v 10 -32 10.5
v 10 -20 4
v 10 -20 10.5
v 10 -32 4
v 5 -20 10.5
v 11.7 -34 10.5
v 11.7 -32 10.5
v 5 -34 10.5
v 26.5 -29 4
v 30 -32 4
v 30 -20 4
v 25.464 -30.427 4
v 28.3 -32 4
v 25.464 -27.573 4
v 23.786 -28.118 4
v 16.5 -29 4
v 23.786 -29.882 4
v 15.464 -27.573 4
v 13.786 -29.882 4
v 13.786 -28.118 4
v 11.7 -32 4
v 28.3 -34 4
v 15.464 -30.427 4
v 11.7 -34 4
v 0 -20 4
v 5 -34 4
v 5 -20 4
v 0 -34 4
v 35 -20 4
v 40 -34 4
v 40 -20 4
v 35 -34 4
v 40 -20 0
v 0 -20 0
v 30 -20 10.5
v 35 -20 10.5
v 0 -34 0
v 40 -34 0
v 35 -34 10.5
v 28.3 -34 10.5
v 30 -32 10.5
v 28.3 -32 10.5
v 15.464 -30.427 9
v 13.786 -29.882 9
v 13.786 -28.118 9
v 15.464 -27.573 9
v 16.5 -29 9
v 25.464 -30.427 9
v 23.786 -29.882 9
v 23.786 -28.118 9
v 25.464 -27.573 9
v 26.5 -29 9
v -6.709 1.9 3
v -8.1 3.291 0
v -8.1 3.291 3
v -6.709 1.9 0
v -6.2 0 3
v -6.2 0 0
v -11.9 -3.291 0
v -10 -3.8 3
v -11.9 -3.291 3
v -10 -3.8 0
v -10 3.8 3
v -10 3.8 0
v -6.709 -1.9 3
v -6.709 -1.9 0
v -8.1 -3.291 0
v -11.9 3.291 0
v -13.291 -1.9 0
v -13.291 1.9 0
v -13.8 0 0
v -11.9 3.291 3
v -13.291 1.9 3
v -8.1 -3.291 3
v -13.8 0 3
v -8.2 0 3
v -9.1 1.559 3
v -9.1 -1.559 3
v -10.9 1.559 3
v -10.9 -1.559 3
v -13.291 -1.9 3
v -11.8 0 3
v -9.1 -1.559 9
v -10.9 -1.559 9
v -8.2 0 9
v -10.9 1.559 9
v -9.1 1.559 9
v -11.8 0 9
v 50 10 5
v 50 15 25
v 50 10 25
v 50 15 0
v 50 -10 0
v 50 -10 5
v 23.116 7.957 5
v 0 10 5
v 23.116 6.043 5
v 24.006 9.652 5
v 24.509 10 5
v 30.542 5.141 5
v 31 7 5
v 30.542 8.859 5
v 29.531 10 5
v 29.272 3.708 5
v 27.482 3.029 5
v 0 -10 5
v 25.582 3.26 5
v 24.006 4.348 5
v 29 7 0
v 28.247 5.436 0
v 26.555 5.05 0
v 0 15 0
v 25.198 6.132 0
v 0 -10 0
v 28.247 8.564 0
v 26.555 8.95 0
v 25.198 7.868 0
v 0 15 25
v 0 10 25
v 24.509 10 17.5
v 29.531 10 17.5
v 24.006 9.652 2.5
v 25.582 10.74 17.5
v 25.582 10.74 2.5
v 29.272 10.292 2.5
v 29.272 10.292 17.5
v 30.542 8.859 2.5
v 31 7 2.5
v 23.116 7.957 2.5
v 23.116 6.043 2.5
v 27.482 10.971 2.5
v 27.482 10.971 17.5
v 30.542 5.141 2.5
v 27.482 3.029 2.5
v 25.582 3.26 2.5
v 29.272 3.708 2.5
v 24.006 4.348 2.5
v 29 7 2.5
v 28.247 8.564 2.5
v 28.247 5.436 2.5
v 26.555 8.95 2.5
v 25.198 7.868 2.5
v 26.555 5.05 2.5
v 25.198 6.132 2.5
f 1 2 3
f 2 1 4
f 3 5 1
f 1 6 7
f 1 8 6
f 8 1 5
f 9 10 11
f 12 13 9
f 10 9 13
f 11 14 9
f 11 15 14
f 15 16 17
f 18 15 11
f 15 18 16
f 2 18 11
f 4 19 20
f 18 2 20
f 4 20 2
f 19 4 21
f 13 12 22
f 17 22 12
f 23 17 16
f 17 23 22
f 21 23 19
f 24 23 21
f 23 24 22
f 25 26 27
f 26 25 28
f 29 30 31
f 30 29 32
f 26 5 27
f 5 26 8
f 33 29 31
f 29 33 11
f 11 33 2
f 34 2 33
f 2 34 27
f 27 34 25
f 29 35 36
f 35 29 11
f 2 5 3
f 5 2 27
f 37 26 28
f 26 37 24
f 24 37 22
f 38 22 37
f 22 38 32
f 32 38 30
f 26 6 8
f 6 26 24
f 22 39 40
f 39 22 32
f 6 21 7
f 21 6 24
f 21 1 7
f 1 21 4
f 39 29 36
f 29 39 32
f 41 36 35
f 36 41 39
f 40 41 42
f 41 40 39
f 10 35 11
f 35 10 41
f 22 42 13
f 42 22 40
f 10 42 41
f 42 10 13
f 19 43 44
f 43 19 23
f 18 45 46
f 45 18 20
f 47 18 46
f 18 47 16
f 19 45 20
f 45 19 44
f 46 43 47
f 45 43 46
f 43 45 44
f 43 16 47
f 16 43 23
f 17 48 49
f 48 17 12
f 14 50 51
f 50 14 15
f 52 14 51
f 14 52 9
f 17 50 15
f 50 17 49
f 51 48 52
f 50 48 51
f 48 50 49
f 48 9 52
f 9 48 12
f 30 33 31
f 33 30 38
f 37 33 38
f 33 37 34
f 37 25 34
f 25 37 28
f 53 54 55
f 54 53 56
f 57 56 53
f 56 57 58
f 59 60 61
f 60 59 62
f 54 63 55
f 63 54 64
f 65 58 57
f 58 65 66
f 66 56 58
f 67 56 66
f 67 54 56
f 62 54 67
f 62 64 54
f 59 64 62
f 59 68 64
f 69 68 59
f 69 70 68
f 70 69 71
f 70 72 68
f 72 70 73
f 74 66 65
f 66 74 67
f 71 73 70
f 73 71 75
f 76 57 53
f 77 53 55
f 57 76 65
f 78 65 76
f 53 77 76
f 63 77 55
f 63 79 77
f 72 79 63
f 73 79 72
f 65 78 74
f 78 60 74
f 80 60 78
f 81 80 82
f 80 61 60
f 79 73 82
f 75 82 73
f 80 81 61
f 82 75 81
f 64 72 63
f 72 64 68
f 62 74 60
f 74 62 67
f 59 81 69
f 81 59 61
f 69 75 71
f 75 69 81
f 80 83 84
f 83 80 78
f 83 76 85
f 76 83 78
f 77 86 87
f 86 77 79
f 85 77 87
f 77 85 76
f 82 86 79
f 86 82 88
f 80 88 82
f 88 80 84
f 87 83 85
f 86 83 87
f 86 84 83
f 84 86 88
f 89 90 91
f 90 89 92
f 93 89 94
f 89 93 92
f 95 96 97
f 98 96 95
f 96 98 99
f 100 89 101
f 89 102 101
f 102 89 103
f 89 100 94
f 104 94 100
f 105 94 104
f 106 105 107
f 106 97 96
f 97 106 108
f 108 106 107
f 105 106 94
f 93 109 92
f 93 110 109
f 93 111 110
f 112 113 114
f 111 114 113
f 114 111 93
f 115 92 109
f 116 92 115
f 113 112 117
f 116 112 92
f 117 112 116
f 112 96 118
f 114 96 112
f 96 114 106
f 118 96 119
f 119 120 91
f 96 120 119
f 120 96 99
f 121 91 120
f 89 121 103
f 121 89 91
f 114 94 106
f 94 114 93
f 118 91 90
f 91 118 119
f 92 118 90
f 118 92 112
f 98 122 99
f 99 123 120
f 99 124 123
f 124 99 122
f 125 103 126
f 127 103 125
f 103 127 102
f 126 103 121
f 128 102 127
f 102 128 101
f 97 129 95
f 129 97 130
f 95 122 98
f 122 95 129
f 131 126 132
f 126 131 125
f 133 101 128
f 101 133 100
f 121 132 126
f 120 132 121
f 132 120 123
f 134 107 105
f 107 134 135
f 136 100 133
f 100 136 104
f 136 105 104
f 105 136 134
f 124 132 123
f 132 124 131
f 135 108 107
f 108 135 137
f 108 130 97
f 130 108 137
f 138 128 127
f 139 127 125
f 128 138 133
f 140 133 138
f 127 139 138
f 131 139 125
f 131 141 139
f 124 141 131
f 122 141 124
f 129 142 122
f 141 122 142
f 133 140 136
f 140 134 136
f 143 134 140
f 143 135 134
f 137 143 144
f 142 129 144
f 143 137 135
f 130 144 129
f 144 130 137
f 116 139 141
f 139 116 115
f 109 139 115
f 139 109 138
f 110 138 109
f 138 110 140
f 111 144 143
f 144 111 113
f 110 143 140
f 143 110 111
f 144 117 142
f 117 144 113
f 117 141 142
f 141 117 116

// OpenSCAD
module switchBracket(x, y)
{
   color([1, .3, 0])
   {
      translate([x + 0, y + -7, 0])
      cube([40, 14, 4]);
   }
   
   color([1, 0, 1])
   {
      translate([x + 5, y + -7, 4])
      cube([5, 14, 6.5]);
      
      translate([x + 10, y + -7, 4])
      cube([1.7, 2, 6.5]);
      
      translate([x + 30, y + -7, 4])
      cube([5, 14, 6.5]);
      
      translate([x + 28.3, y + -7, 4])
      cube([1.7, 2, 6.5]);
      
   }
   
   color([0, 0, 1])
   {
      translate([x + 15, y - 2, 4])
      cylinder(5, 1.5, 1.5);
      
      translate([x + 25, y - 2, 4])
      cylinder(5, 1.5, 1.5);
   }
}

module button(x, y)
{
   color([0, 0, 1])
   {
      translate([-10, 0, 0])
      cylinder(3, 3.8, 3.8);
      
      translate([-10, 0, 0])
      cylinder(9, 1.8, 1.8);
   }
   
   difference()
   {
      color ([1, 0, 0])
      {
         translate([x + 0, y - 10, 0])
         cube([50, 20, 5]);
         
         translate([x + 0, y + 10, 0])
         cube([50, 5, 25]);
      }
      
      color ([1, .3, 0])
      {
         translate([x + 27, y + 7, 2.5])
         cylinder(15, 4, 4);
         
         translate([x + 27, y + 7, -1])
         cylinder(4, 2, 2);
      }

   }
}

//rotate([270, 0, 0])
switchBracket(0, -27);
button(0, 0);
